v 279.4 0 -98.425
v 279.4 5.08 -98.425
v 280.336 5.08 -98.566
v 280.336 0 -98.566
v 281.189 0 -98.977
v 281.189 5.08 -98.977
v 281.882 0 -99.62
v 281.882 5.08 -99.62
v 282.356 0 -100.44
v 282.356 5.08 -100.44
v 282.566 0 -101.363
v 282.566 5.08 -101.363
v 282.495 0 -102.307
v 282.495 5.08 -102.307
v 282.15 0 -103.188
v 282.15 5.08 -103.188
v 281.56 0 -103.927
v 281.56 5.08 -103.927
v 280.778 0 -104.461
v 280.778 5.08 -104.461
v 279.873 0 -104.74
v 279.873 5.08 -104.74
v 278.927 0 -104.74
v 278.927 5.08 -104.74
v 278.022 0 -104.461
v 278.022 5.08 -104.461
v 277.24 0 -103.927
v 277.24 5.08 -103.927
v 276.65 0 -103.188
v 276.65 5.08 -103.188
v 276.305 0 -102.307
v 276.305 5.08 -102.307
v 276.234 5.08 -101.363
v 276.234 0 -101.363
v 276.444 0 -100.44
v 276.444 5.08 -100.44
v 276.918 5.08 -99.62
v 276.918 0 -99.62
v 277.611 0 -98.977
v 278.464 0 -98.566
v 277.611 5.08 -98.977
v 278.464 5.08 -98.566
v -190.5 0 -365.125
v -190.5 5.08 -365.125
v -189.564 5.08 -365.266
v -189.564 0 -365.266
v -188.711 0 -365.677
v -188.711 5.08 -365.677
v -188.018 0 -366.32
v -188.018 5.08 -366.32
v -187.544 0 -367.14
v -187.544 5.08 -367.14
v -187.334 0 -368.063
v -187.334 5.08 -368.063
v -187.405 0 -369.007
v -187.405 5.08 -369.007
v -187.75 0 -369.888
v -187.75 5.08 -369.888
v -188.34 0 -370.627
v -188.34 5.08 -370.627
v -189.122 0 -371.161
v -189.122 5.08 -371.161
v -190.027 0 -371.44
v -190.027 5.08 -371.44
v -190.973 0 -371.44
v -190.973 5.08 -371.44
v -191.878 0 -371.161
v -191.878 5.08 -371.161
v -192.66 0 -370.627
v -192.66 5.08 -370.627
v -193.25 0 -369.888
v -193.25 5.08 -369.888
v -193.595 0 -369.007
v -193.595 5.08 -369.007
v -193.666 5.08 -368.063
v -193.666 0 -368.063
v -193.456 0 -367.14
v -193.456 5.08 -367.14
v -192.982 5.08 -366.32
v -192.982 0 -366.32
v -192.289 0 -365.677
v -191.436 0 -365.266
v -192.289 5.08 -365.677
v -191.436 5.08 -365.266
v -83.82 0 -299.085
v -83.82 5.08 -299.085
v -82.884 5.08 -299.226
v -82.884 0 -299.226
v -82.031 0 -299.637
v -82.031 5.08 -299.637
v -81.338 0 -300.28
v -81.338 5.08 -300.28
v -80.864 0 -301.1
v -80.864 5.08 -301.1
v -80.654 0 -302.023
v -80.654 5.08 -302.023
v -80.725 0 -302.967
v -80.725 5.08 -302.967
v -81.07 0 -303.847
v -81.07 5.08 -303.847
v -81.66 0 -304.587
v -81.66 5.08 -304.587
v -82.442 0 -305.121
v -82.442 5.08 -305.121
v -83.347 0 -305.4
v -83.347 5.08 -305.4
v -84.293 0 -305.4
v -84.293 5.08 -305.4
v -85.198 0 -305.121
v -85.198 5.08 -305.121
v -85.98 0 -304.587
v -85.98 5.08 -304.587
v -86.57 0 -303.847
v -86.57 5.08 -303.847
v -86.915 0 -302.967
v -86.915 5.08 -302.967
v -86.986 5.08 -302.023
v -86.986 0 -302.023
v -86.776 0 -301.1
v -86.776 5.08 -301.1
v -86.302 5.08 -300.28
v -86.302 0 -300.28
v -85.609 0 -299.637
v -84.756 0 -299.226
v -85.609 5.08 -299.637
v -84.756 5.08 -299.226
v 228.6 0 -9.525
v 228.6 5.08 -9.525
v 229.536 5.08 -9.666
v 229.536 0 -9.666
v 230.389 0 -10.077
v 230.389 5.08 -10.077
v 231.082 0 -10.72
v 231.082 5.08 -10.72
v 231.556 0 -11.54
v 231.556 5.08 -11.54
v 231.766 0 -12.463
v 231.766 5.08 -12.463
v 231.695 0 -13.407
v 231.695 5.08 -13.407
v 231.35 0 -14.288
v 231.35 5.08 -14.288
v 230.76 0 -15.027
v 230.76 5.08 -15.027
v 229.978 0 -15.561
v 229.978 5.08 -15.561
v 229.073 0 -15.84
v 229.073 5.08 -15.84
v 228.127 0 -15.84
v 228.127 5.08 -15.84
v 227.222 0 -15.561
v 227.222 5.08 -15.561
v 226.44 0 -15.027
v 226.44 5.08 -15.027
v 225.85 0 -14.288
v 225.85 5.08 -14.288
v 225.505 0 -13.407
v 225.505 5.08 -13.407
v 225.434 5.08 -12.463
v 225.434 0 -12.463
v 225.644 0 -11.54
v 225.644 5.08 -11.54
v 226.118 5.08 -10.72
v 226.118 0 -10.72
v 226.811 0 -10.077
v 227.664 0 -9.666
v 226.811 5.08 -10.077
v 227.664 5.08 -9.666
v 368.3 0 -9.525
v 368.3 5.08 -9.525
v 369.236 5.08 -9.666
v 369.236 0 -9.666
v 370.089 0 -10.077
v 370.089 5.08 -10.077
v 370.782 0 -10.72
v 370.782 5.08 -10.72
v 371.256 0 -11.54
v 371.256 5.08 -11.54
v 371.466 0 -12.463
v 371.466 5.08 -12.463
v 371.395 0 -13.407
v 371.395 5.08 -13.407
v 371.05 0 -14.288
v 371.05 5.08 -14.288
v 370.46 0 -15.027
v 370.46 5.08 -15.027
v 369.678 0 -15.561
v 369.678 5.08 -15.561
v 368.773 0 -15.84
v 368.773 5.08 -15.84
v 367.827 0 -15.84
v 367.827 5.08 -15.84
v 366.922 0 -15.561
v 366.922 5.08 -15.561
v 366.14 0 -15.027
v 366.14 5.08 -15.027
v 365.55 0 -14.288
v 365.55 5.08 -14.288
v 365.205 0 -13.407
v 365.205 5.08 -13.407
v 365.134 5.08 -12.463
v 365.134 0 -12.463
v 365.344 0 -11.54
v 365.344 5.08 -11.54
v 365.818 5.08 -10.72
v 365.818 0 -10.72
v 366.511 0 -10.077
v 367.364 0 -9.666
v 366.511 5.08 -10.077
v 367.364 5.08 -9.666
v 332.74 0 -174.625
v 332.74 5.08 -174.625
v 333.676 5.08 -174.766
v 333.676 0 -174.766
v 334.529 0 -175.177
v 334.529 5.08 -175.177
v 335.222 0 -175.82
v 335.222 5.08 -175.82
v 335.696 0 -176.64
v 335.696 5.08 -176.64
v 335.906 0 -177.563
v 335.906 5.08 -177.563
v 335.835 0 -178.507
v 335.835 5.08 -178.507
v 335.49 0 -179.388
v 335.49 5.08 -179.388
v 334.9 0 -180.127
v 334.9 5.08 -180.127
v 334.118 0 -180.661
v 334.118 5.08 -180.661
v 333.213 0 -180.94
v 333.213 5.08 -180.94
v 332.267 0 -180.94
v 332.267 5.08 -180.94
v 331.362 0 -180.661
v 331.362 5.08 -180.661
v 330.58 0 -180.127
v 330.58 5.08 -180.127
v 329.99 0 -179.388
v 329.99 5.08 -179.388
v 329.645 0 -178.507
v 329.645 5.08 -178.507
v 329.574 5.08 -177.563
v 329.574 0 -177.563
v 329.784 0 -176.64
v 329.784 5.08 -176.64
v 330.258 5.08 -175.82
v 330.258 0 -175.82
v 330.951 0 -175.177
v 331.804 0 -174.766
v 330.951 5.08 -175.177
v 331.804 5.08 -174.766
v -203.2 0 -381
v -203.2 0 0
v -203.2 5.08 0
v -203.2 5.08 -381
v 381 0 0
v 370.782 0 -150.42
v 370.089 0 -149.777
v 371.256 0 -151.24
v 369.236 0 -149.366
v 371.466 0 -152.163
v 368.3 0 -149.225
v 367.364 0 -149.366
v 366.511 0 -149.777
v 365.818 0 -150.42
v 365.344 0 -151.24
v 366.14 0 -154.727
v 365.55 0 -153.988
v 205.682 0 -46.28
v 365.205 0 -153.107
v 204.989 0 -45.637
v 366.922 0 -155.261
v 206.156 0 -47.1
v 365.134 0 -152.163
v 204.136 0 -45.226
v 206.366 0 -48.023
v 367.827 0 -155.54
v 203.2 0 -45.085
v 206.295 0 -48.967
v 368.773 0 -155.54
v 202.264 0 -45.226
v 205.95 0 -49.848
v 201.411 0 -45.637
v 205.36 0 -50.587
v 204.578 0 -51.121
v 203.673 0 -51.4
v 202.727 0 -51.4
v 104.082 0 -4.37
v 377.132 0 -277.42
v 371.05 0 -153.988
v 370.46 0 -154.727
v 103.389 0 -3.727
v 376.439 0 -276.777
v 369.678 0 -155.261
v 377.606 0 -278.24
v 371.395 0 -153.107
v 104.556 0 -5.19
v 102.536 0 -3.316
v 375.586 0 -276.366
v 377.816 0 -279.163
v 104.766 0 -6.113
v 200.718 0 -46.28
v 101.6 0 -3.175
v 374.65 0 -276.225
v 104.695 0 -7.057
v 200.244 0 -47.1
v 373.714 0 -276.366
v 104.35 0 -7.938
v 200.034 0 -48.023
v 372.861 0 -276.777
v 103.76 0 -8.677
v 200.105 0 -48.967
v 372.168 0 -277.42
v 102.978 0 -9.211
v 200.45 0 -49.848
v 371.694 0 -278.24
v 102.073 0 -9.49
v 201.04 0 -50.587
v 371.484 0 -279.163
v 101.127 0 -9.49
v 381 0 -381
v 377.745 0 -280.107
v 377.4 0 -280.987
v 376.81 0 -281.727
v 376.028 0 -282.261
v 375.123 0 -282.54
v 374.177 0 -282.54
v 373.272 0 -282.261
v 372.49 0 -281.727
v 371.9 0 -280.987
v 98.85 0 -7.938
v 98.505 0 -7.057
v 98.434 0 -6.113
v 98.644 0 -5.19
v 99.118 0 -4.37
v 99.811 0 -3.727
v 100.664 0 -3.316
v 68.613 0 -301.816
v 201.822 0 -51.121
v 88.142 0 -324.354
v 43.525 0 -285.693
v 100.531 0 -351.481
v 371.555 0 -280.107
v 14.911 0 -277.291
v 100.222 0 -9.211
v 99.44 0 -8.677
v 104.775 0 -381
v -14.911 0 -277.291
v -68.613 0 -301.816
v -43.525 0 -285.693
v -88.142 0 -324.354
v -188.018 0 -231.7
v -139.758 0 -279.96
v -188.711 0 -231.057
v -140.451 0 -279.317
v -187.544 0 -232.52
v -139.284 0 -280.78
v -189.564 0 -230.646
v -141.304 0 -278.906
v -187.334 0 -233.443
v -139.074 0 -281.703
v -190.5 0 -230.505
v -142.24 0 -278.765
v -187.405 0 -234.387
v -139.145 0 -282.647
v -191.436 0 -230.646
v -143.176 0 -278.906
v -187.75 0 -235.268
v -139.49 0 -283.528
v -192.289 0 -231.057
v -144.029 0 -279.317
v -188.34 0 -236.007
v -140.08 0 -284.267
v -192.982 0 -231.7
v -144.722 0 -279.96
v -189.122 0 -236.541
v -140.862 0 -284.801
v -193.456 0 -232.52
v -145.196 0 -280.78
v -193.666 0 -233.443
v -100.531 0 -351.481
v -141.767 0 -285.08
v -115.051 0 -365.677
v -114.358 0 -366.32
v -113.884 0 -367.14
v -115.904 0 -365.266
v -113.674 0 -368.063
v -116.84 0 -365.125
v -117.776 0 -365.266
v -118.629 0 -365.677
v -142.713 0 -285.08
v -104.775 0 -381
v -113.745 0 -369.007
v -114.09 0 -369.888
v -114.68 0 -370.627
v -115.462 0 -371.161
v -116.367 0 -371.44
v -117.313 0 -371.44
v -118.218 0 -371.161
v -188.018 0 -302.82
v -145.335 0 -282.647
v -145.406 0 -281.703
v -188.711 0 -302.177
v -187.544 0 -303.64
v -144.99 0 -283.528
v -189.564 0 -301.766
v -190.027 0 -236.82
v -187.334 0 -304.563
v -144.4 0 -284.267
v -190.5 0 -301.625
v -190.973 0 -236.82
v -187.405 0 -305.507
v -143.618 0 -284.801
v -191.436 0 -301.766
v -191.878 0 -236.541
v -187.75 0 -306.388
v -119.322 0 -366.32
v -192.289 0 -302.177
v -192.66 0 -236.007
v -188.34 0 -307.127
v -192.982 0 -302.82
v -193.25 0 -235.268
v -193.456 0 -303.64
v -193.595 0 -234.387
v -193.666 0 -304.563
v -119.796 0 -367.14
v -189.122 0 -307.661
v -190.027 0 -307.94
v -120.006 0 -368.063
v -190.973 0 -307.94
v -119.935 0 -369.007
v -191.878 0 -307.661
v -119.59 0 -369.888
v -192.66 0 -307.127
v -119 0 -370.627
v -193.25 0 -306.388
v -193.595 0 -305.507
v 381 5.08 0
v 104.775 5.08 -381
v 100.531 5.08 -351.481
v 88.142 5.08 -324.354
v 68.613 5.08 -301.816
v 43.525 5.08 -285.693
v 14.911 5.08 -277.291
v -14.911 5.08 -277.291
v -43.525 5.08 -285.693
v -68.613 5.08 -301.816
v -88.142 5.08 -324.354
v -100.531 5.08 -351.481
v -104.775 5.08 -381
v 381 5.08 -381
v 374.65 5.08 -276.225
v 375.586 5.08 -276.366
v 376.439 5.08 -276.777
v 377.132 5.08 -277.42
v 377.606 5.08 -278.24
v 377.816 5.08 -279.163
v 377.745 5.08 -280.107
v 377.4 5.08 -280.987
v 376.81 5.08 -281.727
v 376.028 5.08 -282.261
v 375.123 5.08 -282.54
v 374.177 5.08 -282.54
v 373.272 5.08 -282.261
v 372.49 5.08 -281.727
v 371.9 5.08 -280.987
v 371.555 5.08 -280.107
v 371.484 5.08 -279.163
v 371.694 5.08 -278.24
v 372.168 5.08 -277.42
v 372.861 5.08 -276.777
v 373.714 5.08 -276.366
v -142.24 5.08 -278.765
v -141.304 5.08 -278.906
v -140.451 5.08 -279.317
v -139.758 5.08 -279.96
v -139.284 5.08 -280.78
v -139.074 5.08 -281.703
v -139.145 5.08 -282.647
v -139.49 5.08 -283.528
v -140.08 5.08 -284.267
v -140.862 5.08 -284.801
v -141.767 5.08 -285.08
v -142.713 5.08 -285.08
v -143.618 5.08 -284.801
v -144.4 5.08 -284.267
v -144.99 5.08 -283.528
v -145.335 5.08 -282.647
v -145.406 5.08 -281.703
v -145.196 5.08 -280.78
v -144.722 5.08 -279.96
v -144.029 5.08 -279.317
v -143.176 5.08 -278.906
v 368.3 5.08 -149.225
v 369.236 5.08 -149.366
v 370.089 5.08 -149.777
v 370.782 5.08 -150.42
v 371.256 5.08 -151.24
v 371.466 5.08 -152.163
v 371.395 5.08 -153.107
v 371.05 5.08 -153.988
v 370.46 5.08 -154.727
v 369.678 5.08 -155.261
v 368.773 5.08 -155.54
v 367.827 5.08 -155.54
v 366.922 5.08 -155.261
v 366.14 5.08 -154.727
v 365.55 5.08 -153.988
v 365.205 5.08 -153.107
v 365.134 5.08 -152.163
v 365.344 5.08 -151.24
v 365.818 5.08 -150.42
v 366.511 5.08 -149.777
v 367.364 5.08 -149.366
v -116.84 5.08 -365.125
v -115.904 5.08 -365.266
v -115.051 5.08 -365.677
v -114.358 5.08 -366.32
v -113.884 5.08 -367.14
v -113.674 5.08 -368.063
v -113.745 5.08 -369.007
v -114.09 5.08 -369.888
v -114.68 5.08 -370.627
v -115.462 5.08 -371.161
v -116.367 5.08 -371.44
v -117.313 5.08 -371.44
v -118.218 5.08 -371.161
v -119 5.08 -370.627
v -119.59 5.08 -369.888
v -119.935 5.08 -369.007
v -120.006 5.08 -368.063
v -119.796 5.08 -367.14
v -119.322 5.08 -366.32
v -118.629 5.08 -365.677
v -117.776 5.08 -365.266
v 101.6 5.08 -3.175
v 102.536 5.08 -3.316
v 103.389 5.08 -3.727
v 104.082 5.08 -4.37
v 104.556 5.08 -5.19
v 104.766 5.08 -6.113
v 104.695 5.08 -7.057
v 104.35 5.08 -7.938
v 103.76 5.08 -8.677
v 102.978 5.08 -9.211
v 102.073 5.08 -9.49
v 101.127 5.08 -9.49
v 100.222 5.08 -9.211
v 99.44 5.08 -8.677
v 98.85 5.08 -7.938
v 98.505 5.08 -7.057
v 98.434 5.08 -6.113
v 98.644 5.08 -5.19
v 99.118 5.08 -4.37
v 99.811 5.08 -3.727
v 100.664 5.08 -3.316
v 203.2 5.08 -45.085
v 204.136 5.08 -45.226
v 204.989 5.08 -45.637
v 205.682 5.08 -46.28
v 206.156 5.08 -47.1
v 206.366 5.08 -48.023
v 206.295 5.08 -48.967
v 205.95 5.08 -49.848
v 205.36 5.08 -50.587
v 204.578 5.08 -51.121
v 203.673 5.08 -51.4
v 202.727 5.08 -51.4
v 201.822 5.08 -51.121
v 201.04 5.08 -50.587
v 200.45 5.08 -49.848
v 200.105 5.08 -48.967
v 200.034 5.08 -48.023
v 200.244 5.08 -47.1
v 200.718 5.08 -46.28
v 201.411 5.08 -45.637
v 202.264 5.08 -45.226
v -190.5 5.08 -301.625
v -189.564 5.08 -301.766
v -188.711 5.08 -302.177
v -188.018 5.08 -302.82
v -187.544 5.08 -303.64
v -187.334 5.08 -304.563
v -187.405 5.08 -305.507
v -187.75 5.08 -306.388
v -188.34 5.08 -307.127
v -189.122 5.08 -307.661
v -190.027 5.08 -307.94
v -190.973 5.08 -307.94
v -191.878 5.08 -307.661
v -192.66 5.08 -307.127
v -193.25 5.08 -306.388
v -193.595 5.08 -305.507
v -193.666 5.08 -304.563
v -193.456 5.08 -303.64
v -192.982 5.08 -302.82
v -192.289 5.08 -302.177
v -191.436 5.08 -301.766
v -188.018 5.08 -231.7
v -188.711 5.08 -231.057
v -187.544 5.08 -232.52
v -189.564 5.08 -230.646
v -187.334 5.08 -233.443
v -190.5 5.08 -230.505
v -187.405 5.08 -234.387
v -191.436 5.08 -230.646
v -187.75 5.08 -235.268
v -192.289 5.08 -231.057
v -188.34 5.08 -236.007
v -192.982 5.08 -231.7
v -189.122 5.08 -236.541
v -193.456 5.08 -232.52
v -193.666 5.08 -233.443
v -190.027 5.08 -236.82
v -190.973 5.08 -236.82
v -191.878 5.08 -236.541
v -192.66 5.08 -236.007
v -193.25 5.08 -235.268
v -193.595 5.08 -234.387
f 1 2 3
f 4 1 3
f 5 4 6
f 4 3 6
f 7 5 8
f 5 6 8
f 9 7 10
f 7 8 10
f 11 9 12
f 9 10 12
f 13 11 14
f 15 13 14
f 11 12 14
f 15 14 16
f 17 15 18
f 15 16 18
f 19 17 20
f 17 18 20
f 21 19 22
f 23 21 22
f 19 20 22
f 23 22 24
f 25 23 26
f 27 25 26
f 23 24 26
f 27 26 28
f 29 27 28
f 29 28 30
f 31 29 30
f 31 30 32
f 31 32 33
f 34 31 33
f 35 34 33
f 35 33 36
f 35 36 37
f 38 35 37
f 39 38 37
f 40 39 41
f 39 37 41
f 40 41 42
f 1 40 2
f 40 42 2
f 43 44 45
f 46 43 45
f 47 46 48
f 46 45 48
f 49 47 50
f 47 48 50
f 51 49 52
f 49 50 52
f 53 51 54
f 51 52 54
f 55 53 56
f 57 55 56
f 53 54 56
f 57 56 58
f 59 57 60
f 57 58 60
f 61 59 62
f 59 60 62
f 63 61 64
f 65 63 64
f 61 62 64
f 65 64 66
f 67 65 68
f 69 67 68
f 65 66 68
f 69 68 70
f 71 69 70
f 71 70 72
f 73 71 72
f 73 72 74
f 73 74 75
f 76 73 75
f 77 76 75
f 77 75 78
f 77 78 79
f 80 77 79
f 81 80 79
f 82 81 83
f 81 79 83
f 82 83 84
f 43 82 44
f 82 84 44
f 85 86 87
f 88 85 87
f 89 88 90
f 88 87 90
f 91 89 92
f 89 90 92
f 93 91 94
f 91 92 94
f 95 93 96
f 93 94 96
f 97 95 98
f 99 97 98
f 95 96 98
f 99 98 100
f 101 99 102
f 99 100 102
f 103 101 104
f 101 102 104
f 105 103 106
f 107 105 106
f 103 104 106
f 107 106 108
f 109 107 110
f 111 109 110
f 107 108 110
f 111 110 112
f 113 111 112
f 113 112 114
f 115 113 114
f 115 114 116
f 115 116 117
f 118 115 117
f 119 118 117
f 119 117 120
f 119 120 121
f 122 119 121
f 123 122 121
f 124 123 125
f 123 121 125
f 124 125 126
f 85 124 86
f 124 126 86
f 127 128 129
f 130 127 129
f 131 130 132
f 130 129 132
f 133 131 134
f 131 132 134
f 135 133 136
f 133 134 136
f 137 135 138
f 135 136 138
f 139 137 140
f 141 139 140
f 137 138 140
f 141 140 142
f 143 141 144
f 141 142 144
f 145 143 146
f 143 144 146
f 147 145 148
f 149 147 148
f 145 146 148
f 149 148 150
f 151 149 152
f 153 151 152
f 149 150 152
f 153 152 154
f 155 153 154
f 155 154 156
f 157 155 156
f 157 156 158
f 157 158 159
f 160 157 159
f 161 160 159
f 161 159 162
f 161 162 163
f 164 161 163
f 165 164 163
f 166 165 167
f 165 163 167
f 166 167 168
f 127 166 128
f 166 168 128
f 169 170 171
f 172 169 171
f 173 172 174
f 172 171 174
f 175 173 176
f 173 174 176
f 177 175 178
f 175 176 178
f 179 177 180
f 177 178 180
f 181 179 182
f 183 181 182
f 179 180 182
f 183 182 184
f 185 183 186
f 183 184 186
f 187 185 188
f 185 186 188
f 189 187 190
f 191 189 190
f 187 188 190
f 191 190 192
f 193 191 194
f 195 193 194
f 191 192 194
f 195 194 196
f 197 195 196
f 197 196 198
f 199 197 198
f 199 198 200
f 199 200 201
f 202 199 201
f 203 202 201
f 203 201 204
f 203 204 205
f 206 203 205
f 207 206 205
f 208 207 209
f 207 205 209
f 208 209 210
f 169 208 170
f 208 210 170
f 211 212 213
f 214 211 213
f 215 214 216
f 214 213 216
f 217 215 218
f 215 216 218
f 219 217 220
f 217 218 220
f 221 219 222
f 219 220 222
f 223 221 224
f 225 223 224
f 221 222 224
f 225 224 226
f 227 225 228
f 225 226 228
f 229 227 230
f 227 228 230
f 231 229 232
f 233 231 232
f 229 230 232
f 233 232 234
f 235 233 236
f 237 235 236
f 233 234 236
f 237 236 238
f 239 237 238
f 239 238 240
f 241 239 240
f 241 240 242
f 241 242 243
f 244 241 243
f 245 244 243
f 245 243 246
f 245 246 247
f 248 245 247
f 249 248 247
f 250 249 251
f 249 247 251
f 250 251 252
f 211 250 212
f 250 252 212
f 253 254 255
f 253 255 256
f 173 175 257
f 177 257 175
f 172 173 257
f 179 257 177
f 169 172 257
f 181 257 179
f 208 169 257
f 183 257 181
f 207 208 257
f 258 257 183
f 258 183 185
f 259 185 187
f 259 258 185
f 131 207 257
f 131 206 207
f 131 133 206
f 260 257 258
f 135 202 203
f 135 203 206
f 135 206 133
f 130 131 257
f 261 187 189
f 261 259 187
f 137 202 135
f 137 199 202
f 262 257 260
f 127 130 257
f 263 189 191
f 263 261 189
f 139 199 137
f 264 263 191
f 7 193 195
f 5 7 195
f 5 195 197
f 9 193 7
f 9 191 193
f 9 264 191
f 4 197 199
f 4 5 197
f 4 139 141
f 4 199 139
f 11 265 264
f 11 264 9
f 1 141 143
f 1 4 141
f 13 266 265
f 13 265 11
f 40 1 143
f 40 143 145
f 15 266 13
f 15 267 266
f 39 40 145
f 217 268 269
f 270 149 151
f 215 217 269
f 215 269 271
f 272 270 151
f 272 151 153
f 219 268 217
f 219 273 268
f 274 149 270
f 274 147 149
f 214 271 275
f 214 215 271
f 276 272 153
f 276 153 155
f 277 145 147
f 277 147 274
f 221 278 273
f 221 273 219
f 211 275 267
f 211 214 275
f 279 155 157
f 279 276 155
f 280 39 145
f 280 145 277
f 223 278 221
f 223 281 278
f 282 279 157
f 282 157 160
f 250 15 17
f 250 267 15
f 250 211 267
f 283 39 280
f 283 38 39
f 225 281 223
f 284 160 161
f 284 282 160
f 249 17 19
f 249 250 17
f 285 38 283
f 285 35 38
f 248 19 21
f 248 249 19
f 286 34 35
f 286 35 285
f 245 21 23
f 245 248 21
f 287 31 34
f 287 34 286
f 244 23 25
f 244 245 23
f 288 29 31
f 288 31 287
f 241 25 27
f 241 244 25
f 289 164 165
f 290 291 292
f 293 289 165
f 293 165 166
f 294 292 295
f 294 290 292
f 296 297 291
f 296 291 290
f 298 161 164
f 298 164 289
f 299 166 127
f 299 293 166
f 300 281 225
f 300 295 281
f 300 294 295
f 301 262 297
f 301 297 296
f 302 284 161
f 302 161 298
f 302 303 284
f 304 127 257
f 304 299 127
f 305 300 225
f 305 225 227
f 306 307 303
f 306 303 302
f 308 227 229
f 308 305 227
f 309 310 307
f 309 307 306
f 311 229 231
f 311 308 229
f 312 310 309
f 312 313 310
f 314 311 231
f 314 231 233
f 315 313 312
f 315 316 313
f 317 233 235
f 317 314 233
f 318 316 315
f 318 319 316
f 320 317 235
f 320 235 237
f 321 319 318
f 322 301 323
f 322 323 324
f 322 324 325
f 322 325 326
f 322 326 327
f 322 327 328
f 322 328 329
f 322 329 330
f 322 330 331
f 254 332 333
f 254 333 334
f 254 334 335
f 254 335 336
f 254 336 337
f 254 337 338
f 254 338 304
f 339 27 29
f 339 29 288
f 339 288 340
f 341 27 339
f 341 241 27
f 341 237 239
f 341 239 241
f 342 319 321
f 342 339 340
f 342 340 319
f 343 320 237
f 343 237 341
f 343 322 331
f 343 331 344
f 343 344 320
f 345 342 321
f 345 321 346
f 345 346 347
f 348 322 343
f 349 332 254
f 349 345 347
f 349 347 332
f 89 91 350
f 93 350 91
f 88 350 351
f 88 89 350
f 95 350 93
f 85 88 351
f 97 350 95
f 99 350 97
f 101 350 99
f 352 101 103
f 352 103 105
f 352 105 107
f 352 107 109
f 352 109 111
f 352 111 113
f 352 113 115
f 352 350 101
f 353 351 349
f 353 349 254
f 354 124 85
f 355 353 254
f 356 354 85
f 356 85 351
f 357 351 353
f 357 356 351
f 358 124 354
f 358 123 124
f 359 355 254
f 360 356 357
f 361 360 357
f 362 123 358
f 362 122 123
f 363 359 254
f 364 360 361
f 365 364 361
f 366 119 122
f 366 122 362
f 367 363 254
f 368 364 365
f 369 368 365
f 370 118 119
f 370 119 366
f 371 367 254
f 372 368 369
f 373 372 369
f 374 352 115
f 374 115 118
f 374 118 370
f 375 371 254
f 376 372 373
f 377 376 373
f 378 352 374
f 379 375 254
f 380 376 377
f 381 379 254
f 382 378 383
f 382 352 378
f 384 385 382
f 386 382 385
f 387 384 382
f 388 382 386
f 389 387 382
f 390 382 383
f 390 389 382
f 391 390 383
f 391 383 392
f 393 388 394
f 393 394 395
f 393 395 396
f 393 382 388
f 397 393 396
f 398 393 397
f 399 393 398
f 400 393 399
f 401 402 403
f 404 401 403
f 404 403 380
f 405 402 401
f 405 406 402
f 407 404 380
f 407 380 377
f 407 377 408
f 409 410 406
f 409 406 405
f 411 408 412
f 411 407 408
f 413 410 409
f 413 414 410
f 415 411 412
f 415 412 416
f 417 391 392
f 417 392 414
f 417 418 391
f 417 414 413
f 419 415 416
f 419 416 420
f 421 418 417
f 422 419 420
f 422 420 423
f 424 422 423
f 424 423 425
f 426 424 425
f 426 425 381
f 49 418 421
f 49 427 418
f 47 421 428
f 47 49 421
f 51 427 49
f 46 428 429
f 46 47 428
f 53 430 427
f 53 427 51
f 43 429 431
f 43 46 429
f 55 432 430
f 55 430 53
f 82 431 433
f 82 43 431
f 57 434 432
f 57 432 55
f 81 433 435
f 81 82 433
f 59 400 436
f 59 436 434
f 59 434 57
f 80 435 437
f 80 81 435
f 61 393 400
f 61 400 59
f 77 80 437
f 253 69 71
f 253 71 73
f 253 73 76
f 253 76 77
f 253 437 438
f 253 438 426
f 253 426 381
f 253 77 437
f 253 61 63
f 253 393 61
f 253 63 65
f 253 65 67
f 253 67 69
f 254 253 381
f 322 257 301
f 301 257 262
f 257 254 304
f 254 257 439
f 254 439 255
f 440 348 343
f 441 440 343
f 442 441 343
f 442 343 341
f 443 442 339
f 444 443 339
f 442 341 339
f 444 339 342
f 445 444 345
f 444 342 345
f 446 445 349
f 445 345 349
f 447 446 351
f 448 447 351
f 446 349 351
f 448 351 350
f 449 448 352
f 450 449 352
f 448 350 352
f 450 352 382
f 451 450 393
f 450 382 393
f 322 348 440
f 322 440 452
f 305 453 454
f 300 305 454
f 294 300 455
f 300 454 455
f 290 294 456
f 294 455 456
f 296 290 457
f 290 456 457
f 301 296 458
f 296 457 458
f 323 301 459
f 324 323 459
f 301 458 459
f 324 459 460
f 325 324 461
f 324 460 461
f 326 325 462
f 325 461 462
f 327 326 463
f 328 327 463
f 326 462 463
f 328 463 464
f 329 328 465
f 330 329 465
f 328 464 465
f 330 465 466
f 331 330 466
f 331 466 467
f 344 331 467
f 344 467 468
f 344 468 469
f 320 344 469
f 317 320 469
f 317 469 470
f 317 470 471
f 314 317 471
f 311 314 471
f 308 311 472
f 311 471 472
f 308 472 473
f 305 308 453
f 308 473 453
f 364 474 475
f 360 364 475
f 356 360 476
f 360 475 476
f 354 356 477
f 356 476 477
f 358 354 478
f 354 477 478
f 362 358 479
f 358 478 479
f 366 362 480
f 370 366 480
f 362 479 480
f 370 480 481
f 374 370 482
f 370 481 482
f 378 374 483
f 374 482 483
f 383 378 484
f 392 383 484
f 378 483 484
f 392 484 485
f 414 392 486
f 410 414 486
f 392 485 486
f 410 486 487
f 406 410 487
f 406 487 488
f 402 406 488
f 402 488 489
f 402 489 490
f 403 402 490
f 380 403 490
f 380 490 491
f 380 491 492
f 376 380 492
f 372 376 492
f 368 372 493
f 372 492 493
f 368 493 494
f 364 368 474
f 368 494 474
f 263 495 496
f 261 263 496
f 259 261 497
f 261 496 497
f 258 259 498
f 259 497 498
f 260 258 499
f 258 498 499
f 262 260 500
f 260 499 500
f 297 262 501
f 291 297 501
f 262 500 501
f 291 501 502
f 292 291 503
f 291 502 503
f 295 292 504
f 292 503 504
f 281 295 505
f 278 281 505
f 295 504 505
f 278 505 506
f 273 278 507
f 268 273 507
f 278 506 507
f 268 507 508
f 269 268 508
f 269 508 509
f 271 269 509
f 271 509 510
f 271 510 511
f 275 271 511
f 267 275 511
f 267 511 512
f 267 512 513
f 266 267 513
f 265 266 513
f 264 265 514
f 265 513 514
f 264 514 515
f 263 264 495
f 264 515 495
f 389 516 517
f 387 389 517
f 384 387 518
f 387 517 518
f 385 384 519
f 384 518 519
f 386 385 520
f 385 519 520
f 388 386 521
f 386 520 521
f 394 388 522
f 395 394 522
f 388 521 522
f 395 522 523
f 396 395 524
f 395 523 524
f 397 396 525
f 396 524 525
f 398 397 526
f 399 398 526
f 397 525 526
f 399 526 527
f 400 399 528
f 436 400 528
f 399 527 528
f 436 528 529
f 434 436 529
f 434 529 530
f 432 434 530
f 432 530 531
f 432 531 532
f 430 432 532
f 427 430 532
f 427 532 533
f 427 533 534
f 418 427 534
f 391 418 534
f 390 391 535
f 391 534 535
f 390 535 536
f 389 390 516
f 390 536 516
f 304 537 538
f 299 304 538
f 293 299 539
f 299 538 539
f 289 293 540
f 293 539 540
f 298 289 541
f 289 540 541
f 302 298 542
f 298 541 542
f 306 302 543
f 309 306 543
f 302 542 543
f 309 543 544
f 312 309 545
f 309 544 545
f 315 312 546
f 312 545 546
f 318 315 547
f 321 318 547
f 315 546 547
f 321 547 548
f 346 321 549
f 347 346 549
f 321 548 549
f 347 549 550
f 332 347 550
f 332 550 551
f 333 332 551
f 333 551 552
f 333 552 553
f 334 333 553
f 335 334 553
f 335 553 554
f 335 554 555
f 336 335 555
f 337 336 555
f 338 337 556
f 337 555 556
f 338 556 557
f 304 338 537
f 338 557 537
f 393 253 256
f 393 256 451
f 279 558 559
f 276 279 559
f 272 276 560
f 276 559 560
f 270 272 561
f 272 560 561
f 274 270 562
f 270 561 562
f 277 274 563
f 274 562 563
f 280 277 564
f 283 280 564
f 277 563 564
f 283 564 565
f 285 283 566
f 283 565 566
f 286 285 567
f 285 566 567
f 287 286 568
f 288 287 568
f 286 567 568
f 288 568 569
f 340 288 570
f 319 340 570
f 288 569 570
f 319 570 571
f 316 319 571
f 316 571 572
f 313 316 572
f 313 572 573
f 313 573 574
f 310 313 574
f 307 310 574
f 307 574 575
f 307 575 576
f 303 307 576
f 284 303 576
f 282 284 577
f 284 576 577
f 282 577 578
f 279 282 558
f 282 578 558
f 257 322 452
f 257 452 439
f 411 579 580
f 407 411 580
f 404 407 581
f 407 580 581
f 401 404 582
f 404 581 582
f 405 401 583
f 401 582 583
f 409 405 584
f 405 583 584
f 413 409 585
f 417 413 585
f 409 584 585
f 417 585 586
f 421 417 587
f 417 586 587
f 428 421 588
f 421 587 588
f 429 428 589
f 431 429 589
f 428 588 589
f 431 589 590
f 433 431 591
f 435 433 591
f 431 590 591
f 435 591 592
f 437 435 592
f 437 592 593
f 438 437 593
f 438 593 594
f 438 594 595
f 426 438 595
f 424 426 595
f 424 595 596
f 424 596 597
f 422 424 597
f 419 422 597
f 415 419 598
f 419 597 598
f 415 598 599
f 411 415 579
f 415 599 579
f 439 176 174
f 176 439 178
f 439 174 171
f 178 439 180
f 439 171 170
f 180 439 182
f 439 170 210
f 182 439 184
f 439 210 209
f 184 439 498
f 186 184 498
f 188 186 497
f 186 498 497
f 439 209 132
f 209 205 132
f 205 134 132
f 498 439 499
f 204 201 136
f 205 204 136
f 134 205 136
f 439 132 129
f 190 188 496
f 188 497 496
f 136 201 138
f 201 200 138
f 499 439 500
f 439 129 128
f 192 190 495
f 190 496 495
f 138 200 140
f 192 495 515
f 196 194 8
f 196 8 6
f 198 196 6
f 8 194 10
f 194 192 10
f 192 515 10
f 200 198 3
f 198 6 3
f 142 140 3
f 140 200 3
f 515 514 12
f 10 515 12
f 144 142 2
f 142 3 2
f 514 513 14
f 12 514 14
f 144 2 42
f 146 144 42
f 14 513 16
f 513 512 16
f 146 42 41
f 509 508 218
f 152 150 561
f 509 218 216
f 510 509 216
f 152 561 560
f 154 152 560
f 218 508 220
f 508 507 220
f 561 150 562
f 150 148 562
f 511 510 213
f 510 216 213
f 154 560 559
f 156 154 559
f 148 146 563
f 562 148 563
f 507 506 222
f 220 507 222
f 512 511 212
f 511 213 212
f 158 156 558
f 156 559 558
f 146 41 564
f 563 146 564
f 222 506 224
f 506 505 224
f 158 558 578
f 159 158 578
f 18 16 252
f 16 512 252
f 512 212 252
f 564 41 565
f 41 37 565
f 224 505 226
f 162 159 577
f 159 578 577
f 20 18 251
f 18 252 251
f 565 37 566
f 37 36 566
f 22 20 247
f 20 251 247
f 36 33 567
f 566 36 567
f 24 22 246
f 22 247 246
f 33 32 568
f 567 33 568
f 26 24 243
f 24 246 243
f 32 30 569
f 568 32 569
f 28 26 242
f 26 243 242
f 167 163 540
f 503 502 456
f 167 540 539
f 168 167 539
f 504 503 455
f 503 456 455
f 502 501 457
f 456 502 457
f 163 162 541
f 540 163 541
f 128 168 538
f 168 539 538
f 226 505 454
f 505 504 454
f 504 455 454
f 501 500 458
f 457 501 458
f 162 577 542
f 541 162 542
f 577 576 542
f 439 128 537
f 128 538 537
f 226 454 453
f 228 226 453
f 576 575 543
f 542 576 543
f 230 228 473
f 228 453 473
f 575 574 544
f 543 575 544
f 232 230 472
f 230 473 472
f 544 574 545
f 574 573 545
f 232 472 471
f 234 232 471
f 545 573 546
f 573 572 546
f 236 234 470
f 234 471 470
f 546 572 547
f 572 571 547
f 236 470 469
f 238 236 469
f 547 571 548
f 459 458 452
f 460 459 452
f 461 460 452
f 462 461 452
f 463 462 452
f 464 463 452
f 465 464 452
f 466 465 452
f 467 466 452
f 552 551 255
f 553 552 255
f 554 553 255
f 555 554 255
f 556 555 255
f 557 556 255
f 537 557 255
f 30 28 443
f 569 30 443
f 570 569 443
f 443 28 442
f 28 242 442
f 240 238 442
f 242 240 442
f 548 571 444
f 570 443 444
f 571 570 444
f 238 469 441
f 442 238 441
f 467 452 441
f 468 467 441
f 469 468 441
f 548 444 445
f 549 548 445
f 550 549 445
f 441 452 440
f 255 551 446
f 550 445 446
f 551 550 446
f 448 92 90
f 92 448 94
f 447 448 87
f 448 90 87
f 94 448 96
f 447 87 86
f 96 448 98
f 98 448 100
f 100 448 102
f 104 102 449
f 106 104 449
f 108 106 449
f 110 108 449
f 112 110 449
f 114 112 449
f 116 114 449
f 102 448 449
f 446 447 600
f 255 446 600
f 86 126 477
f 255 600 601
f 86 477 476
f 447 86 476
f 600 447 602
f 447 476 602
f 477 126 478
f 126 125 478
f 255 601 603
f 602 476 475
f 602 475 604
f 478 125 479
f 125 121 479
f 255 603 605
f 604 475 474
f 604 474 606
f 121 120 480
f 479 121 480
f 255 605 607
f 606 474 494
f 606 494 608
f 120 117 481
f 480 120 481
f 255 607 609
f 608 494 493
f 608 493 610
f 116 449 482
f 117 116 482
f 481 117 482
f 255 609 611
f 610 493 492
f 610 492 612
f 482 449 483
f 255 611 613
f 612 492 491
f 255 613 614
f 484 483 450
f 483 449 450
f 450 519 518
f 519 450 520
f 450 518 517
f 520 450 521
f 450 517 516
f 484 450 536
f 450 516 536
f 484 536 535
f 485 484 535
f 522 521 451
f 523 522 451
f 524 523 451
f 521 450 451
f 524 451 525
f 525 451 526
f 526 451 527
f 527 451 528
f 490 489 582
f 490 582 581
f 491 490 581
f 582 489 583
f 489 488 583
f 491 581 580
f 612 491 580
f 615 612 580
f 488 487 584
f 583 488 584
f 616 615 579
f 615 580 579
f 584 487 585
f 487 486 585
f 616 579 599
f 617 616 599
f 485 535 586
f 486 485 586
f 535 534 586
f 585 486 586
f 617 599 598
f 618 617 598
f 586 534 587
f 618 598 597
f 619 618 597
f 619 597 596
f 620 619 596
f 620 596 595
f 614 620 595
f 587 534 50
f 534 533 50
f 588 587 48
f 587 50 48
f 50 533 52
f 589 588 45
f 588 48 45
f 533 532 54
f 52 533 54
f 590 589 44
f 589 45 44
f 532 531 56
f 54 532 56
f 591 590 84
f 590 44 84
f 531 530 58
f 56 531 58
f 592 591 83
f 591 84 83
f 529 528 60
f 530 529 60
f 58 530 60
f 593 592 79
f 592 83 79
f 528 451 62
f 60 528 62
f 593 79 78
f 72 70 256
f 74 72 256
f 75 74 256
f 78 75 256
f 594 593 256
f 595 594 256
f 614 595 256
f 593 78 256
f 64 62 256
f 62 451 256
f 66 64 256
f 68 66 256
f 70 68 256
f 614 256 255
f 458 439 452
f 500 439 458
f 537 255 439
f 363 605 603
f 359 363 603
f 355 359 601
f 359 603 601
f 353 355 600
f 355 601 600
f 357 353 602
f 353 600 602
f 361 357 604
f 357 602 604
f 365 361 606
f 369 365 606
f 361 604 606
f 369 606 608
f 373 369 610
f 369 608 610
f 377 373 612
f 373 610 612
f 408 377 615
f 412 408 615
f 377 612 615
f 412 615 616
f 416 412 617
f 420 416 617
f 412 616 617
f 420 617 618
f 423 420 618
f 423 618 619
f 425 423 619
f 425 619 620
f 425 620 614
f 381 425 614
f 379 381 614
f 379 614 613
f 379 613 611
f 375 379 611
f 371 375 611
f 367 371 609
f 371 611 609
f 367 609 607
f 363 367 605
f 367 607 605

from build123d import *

# Parameters (mm, degrees)
BOSS_EXTRUDE1_DEPTH = 5.08
SKETCH4_R           = 104.775
CUT_EXTRUDE1_DEPTH  = 50.8
SKETCH5_R           = 3.175
CUT_EXTRUDE2_DEPTH  = 5.08
SKETCH6_R           = 3.175
CUT_EXTRUDE3_DEPTH  = 5.08


with BuildPart() as part:
    # Sketch2 → Boss-Extrude1 (new body)
    with BuildSketch(Plane(origin=(0, 0, 0), x_dir=(1, 0, 0), z_dir=(0, 1, 0))):
        Polygon((-203.2, 381), (-44.423028516, 381), (-44.423028516, 423.747508854), (44.020558762, 423.747508854), (44.020558762, 381), (381, 381), (381, 0), (-203.2, 0), align=None)
    extrude(amount=BOSS_EXTRUDE1_DEPTH)

    # Sketch4 → Cut-Extrude1 (cut)
    with BuildSketch(Plane.XZ):
        with Locations((0, -381)):
            Circle(SKETCH4_R)
    extrude(amount=-CUT_EXTRUDE1_DEPTH, mode=Mode.SUBTRACT)

    # Sketch5 → Cut-Extrude2 (cut)
    with BuildSketch(Plane(origin=(0, 5.08, 0), x_dir=(1, 0, 0), z_dir=(0, 1, 0))):
        with Locations(Location((332.74, 177.8, 0), (0, 0, 270))):
            Circle(SKETCH5_R)
        with Locations(Location((101.6, 6.35, 0), (0, 0, 270))):
            Circle(SKETCH5_R)
        with Locations(Location((203.2, 48.26, 0), (0, 0, 270))):
            Circle(SKETCH5_R)
        with Locations(Location((279.4, 101.6, 0), (0, 0, 270))):
            Circle(SKETCH5_R)
        with Locations(Location((368.3, 152.4, 0), (0, 0, 270))):
            Circle(SKETCH5_R)
        with Locations(Location((374.65, 279.4, 0), (0, 0, 270))):
            Circle(SKETCH5_R)
        with Locations(Location((368.3, 12.7, 0), (0, 0, 270))):
            Circle(SKETCH5_R)
        with Locations(Location((228.6, 12.7, 0), (0, 0, 270))):
            Circle(SKETCH5_R)
    extrude(amount=-CUT_EXTRUDE2_DEPTH, mode=Mode.SUBTRACT)

    # Sketch6 → Cut-Extrude3 (cut)
    with BuildSketch(Plane(origin=(0, 5.08, 0), x_dir=(1, 0, 0), z_dir=(0, 1, 0))):
        with Locations(Location((-190.5, 368.3, 0), (0, 0, 270))):
            Circle(SKETCH6_R)
        with Locations(Location((-116.84, 368.3, 0), (0, 0, 270))):
            Circle(SKETCH6_R)
        with Locations(Location((-83.82, 302.26, 0), (0, 0, 270))):
            Circle(SKETCH6_R)
        with Locations(Location((-142.24, 281.94, 0), (0, 0, 270))):
            Circle(SKETCH6_R)
        with Locations(Location((-190.5, 233.68, 0), (0, 0, 270))):
            Circle(SKETCH6_R)
        with Locations(Location((-190.5, 304.8, 0), (0, 0, 270))):
            Circle(SKETCH6_R)
    extrude(amount=-CUT_EXTRUDE3_DEPTH, mode=Mode.SUBTRACT)


solid = part.part
